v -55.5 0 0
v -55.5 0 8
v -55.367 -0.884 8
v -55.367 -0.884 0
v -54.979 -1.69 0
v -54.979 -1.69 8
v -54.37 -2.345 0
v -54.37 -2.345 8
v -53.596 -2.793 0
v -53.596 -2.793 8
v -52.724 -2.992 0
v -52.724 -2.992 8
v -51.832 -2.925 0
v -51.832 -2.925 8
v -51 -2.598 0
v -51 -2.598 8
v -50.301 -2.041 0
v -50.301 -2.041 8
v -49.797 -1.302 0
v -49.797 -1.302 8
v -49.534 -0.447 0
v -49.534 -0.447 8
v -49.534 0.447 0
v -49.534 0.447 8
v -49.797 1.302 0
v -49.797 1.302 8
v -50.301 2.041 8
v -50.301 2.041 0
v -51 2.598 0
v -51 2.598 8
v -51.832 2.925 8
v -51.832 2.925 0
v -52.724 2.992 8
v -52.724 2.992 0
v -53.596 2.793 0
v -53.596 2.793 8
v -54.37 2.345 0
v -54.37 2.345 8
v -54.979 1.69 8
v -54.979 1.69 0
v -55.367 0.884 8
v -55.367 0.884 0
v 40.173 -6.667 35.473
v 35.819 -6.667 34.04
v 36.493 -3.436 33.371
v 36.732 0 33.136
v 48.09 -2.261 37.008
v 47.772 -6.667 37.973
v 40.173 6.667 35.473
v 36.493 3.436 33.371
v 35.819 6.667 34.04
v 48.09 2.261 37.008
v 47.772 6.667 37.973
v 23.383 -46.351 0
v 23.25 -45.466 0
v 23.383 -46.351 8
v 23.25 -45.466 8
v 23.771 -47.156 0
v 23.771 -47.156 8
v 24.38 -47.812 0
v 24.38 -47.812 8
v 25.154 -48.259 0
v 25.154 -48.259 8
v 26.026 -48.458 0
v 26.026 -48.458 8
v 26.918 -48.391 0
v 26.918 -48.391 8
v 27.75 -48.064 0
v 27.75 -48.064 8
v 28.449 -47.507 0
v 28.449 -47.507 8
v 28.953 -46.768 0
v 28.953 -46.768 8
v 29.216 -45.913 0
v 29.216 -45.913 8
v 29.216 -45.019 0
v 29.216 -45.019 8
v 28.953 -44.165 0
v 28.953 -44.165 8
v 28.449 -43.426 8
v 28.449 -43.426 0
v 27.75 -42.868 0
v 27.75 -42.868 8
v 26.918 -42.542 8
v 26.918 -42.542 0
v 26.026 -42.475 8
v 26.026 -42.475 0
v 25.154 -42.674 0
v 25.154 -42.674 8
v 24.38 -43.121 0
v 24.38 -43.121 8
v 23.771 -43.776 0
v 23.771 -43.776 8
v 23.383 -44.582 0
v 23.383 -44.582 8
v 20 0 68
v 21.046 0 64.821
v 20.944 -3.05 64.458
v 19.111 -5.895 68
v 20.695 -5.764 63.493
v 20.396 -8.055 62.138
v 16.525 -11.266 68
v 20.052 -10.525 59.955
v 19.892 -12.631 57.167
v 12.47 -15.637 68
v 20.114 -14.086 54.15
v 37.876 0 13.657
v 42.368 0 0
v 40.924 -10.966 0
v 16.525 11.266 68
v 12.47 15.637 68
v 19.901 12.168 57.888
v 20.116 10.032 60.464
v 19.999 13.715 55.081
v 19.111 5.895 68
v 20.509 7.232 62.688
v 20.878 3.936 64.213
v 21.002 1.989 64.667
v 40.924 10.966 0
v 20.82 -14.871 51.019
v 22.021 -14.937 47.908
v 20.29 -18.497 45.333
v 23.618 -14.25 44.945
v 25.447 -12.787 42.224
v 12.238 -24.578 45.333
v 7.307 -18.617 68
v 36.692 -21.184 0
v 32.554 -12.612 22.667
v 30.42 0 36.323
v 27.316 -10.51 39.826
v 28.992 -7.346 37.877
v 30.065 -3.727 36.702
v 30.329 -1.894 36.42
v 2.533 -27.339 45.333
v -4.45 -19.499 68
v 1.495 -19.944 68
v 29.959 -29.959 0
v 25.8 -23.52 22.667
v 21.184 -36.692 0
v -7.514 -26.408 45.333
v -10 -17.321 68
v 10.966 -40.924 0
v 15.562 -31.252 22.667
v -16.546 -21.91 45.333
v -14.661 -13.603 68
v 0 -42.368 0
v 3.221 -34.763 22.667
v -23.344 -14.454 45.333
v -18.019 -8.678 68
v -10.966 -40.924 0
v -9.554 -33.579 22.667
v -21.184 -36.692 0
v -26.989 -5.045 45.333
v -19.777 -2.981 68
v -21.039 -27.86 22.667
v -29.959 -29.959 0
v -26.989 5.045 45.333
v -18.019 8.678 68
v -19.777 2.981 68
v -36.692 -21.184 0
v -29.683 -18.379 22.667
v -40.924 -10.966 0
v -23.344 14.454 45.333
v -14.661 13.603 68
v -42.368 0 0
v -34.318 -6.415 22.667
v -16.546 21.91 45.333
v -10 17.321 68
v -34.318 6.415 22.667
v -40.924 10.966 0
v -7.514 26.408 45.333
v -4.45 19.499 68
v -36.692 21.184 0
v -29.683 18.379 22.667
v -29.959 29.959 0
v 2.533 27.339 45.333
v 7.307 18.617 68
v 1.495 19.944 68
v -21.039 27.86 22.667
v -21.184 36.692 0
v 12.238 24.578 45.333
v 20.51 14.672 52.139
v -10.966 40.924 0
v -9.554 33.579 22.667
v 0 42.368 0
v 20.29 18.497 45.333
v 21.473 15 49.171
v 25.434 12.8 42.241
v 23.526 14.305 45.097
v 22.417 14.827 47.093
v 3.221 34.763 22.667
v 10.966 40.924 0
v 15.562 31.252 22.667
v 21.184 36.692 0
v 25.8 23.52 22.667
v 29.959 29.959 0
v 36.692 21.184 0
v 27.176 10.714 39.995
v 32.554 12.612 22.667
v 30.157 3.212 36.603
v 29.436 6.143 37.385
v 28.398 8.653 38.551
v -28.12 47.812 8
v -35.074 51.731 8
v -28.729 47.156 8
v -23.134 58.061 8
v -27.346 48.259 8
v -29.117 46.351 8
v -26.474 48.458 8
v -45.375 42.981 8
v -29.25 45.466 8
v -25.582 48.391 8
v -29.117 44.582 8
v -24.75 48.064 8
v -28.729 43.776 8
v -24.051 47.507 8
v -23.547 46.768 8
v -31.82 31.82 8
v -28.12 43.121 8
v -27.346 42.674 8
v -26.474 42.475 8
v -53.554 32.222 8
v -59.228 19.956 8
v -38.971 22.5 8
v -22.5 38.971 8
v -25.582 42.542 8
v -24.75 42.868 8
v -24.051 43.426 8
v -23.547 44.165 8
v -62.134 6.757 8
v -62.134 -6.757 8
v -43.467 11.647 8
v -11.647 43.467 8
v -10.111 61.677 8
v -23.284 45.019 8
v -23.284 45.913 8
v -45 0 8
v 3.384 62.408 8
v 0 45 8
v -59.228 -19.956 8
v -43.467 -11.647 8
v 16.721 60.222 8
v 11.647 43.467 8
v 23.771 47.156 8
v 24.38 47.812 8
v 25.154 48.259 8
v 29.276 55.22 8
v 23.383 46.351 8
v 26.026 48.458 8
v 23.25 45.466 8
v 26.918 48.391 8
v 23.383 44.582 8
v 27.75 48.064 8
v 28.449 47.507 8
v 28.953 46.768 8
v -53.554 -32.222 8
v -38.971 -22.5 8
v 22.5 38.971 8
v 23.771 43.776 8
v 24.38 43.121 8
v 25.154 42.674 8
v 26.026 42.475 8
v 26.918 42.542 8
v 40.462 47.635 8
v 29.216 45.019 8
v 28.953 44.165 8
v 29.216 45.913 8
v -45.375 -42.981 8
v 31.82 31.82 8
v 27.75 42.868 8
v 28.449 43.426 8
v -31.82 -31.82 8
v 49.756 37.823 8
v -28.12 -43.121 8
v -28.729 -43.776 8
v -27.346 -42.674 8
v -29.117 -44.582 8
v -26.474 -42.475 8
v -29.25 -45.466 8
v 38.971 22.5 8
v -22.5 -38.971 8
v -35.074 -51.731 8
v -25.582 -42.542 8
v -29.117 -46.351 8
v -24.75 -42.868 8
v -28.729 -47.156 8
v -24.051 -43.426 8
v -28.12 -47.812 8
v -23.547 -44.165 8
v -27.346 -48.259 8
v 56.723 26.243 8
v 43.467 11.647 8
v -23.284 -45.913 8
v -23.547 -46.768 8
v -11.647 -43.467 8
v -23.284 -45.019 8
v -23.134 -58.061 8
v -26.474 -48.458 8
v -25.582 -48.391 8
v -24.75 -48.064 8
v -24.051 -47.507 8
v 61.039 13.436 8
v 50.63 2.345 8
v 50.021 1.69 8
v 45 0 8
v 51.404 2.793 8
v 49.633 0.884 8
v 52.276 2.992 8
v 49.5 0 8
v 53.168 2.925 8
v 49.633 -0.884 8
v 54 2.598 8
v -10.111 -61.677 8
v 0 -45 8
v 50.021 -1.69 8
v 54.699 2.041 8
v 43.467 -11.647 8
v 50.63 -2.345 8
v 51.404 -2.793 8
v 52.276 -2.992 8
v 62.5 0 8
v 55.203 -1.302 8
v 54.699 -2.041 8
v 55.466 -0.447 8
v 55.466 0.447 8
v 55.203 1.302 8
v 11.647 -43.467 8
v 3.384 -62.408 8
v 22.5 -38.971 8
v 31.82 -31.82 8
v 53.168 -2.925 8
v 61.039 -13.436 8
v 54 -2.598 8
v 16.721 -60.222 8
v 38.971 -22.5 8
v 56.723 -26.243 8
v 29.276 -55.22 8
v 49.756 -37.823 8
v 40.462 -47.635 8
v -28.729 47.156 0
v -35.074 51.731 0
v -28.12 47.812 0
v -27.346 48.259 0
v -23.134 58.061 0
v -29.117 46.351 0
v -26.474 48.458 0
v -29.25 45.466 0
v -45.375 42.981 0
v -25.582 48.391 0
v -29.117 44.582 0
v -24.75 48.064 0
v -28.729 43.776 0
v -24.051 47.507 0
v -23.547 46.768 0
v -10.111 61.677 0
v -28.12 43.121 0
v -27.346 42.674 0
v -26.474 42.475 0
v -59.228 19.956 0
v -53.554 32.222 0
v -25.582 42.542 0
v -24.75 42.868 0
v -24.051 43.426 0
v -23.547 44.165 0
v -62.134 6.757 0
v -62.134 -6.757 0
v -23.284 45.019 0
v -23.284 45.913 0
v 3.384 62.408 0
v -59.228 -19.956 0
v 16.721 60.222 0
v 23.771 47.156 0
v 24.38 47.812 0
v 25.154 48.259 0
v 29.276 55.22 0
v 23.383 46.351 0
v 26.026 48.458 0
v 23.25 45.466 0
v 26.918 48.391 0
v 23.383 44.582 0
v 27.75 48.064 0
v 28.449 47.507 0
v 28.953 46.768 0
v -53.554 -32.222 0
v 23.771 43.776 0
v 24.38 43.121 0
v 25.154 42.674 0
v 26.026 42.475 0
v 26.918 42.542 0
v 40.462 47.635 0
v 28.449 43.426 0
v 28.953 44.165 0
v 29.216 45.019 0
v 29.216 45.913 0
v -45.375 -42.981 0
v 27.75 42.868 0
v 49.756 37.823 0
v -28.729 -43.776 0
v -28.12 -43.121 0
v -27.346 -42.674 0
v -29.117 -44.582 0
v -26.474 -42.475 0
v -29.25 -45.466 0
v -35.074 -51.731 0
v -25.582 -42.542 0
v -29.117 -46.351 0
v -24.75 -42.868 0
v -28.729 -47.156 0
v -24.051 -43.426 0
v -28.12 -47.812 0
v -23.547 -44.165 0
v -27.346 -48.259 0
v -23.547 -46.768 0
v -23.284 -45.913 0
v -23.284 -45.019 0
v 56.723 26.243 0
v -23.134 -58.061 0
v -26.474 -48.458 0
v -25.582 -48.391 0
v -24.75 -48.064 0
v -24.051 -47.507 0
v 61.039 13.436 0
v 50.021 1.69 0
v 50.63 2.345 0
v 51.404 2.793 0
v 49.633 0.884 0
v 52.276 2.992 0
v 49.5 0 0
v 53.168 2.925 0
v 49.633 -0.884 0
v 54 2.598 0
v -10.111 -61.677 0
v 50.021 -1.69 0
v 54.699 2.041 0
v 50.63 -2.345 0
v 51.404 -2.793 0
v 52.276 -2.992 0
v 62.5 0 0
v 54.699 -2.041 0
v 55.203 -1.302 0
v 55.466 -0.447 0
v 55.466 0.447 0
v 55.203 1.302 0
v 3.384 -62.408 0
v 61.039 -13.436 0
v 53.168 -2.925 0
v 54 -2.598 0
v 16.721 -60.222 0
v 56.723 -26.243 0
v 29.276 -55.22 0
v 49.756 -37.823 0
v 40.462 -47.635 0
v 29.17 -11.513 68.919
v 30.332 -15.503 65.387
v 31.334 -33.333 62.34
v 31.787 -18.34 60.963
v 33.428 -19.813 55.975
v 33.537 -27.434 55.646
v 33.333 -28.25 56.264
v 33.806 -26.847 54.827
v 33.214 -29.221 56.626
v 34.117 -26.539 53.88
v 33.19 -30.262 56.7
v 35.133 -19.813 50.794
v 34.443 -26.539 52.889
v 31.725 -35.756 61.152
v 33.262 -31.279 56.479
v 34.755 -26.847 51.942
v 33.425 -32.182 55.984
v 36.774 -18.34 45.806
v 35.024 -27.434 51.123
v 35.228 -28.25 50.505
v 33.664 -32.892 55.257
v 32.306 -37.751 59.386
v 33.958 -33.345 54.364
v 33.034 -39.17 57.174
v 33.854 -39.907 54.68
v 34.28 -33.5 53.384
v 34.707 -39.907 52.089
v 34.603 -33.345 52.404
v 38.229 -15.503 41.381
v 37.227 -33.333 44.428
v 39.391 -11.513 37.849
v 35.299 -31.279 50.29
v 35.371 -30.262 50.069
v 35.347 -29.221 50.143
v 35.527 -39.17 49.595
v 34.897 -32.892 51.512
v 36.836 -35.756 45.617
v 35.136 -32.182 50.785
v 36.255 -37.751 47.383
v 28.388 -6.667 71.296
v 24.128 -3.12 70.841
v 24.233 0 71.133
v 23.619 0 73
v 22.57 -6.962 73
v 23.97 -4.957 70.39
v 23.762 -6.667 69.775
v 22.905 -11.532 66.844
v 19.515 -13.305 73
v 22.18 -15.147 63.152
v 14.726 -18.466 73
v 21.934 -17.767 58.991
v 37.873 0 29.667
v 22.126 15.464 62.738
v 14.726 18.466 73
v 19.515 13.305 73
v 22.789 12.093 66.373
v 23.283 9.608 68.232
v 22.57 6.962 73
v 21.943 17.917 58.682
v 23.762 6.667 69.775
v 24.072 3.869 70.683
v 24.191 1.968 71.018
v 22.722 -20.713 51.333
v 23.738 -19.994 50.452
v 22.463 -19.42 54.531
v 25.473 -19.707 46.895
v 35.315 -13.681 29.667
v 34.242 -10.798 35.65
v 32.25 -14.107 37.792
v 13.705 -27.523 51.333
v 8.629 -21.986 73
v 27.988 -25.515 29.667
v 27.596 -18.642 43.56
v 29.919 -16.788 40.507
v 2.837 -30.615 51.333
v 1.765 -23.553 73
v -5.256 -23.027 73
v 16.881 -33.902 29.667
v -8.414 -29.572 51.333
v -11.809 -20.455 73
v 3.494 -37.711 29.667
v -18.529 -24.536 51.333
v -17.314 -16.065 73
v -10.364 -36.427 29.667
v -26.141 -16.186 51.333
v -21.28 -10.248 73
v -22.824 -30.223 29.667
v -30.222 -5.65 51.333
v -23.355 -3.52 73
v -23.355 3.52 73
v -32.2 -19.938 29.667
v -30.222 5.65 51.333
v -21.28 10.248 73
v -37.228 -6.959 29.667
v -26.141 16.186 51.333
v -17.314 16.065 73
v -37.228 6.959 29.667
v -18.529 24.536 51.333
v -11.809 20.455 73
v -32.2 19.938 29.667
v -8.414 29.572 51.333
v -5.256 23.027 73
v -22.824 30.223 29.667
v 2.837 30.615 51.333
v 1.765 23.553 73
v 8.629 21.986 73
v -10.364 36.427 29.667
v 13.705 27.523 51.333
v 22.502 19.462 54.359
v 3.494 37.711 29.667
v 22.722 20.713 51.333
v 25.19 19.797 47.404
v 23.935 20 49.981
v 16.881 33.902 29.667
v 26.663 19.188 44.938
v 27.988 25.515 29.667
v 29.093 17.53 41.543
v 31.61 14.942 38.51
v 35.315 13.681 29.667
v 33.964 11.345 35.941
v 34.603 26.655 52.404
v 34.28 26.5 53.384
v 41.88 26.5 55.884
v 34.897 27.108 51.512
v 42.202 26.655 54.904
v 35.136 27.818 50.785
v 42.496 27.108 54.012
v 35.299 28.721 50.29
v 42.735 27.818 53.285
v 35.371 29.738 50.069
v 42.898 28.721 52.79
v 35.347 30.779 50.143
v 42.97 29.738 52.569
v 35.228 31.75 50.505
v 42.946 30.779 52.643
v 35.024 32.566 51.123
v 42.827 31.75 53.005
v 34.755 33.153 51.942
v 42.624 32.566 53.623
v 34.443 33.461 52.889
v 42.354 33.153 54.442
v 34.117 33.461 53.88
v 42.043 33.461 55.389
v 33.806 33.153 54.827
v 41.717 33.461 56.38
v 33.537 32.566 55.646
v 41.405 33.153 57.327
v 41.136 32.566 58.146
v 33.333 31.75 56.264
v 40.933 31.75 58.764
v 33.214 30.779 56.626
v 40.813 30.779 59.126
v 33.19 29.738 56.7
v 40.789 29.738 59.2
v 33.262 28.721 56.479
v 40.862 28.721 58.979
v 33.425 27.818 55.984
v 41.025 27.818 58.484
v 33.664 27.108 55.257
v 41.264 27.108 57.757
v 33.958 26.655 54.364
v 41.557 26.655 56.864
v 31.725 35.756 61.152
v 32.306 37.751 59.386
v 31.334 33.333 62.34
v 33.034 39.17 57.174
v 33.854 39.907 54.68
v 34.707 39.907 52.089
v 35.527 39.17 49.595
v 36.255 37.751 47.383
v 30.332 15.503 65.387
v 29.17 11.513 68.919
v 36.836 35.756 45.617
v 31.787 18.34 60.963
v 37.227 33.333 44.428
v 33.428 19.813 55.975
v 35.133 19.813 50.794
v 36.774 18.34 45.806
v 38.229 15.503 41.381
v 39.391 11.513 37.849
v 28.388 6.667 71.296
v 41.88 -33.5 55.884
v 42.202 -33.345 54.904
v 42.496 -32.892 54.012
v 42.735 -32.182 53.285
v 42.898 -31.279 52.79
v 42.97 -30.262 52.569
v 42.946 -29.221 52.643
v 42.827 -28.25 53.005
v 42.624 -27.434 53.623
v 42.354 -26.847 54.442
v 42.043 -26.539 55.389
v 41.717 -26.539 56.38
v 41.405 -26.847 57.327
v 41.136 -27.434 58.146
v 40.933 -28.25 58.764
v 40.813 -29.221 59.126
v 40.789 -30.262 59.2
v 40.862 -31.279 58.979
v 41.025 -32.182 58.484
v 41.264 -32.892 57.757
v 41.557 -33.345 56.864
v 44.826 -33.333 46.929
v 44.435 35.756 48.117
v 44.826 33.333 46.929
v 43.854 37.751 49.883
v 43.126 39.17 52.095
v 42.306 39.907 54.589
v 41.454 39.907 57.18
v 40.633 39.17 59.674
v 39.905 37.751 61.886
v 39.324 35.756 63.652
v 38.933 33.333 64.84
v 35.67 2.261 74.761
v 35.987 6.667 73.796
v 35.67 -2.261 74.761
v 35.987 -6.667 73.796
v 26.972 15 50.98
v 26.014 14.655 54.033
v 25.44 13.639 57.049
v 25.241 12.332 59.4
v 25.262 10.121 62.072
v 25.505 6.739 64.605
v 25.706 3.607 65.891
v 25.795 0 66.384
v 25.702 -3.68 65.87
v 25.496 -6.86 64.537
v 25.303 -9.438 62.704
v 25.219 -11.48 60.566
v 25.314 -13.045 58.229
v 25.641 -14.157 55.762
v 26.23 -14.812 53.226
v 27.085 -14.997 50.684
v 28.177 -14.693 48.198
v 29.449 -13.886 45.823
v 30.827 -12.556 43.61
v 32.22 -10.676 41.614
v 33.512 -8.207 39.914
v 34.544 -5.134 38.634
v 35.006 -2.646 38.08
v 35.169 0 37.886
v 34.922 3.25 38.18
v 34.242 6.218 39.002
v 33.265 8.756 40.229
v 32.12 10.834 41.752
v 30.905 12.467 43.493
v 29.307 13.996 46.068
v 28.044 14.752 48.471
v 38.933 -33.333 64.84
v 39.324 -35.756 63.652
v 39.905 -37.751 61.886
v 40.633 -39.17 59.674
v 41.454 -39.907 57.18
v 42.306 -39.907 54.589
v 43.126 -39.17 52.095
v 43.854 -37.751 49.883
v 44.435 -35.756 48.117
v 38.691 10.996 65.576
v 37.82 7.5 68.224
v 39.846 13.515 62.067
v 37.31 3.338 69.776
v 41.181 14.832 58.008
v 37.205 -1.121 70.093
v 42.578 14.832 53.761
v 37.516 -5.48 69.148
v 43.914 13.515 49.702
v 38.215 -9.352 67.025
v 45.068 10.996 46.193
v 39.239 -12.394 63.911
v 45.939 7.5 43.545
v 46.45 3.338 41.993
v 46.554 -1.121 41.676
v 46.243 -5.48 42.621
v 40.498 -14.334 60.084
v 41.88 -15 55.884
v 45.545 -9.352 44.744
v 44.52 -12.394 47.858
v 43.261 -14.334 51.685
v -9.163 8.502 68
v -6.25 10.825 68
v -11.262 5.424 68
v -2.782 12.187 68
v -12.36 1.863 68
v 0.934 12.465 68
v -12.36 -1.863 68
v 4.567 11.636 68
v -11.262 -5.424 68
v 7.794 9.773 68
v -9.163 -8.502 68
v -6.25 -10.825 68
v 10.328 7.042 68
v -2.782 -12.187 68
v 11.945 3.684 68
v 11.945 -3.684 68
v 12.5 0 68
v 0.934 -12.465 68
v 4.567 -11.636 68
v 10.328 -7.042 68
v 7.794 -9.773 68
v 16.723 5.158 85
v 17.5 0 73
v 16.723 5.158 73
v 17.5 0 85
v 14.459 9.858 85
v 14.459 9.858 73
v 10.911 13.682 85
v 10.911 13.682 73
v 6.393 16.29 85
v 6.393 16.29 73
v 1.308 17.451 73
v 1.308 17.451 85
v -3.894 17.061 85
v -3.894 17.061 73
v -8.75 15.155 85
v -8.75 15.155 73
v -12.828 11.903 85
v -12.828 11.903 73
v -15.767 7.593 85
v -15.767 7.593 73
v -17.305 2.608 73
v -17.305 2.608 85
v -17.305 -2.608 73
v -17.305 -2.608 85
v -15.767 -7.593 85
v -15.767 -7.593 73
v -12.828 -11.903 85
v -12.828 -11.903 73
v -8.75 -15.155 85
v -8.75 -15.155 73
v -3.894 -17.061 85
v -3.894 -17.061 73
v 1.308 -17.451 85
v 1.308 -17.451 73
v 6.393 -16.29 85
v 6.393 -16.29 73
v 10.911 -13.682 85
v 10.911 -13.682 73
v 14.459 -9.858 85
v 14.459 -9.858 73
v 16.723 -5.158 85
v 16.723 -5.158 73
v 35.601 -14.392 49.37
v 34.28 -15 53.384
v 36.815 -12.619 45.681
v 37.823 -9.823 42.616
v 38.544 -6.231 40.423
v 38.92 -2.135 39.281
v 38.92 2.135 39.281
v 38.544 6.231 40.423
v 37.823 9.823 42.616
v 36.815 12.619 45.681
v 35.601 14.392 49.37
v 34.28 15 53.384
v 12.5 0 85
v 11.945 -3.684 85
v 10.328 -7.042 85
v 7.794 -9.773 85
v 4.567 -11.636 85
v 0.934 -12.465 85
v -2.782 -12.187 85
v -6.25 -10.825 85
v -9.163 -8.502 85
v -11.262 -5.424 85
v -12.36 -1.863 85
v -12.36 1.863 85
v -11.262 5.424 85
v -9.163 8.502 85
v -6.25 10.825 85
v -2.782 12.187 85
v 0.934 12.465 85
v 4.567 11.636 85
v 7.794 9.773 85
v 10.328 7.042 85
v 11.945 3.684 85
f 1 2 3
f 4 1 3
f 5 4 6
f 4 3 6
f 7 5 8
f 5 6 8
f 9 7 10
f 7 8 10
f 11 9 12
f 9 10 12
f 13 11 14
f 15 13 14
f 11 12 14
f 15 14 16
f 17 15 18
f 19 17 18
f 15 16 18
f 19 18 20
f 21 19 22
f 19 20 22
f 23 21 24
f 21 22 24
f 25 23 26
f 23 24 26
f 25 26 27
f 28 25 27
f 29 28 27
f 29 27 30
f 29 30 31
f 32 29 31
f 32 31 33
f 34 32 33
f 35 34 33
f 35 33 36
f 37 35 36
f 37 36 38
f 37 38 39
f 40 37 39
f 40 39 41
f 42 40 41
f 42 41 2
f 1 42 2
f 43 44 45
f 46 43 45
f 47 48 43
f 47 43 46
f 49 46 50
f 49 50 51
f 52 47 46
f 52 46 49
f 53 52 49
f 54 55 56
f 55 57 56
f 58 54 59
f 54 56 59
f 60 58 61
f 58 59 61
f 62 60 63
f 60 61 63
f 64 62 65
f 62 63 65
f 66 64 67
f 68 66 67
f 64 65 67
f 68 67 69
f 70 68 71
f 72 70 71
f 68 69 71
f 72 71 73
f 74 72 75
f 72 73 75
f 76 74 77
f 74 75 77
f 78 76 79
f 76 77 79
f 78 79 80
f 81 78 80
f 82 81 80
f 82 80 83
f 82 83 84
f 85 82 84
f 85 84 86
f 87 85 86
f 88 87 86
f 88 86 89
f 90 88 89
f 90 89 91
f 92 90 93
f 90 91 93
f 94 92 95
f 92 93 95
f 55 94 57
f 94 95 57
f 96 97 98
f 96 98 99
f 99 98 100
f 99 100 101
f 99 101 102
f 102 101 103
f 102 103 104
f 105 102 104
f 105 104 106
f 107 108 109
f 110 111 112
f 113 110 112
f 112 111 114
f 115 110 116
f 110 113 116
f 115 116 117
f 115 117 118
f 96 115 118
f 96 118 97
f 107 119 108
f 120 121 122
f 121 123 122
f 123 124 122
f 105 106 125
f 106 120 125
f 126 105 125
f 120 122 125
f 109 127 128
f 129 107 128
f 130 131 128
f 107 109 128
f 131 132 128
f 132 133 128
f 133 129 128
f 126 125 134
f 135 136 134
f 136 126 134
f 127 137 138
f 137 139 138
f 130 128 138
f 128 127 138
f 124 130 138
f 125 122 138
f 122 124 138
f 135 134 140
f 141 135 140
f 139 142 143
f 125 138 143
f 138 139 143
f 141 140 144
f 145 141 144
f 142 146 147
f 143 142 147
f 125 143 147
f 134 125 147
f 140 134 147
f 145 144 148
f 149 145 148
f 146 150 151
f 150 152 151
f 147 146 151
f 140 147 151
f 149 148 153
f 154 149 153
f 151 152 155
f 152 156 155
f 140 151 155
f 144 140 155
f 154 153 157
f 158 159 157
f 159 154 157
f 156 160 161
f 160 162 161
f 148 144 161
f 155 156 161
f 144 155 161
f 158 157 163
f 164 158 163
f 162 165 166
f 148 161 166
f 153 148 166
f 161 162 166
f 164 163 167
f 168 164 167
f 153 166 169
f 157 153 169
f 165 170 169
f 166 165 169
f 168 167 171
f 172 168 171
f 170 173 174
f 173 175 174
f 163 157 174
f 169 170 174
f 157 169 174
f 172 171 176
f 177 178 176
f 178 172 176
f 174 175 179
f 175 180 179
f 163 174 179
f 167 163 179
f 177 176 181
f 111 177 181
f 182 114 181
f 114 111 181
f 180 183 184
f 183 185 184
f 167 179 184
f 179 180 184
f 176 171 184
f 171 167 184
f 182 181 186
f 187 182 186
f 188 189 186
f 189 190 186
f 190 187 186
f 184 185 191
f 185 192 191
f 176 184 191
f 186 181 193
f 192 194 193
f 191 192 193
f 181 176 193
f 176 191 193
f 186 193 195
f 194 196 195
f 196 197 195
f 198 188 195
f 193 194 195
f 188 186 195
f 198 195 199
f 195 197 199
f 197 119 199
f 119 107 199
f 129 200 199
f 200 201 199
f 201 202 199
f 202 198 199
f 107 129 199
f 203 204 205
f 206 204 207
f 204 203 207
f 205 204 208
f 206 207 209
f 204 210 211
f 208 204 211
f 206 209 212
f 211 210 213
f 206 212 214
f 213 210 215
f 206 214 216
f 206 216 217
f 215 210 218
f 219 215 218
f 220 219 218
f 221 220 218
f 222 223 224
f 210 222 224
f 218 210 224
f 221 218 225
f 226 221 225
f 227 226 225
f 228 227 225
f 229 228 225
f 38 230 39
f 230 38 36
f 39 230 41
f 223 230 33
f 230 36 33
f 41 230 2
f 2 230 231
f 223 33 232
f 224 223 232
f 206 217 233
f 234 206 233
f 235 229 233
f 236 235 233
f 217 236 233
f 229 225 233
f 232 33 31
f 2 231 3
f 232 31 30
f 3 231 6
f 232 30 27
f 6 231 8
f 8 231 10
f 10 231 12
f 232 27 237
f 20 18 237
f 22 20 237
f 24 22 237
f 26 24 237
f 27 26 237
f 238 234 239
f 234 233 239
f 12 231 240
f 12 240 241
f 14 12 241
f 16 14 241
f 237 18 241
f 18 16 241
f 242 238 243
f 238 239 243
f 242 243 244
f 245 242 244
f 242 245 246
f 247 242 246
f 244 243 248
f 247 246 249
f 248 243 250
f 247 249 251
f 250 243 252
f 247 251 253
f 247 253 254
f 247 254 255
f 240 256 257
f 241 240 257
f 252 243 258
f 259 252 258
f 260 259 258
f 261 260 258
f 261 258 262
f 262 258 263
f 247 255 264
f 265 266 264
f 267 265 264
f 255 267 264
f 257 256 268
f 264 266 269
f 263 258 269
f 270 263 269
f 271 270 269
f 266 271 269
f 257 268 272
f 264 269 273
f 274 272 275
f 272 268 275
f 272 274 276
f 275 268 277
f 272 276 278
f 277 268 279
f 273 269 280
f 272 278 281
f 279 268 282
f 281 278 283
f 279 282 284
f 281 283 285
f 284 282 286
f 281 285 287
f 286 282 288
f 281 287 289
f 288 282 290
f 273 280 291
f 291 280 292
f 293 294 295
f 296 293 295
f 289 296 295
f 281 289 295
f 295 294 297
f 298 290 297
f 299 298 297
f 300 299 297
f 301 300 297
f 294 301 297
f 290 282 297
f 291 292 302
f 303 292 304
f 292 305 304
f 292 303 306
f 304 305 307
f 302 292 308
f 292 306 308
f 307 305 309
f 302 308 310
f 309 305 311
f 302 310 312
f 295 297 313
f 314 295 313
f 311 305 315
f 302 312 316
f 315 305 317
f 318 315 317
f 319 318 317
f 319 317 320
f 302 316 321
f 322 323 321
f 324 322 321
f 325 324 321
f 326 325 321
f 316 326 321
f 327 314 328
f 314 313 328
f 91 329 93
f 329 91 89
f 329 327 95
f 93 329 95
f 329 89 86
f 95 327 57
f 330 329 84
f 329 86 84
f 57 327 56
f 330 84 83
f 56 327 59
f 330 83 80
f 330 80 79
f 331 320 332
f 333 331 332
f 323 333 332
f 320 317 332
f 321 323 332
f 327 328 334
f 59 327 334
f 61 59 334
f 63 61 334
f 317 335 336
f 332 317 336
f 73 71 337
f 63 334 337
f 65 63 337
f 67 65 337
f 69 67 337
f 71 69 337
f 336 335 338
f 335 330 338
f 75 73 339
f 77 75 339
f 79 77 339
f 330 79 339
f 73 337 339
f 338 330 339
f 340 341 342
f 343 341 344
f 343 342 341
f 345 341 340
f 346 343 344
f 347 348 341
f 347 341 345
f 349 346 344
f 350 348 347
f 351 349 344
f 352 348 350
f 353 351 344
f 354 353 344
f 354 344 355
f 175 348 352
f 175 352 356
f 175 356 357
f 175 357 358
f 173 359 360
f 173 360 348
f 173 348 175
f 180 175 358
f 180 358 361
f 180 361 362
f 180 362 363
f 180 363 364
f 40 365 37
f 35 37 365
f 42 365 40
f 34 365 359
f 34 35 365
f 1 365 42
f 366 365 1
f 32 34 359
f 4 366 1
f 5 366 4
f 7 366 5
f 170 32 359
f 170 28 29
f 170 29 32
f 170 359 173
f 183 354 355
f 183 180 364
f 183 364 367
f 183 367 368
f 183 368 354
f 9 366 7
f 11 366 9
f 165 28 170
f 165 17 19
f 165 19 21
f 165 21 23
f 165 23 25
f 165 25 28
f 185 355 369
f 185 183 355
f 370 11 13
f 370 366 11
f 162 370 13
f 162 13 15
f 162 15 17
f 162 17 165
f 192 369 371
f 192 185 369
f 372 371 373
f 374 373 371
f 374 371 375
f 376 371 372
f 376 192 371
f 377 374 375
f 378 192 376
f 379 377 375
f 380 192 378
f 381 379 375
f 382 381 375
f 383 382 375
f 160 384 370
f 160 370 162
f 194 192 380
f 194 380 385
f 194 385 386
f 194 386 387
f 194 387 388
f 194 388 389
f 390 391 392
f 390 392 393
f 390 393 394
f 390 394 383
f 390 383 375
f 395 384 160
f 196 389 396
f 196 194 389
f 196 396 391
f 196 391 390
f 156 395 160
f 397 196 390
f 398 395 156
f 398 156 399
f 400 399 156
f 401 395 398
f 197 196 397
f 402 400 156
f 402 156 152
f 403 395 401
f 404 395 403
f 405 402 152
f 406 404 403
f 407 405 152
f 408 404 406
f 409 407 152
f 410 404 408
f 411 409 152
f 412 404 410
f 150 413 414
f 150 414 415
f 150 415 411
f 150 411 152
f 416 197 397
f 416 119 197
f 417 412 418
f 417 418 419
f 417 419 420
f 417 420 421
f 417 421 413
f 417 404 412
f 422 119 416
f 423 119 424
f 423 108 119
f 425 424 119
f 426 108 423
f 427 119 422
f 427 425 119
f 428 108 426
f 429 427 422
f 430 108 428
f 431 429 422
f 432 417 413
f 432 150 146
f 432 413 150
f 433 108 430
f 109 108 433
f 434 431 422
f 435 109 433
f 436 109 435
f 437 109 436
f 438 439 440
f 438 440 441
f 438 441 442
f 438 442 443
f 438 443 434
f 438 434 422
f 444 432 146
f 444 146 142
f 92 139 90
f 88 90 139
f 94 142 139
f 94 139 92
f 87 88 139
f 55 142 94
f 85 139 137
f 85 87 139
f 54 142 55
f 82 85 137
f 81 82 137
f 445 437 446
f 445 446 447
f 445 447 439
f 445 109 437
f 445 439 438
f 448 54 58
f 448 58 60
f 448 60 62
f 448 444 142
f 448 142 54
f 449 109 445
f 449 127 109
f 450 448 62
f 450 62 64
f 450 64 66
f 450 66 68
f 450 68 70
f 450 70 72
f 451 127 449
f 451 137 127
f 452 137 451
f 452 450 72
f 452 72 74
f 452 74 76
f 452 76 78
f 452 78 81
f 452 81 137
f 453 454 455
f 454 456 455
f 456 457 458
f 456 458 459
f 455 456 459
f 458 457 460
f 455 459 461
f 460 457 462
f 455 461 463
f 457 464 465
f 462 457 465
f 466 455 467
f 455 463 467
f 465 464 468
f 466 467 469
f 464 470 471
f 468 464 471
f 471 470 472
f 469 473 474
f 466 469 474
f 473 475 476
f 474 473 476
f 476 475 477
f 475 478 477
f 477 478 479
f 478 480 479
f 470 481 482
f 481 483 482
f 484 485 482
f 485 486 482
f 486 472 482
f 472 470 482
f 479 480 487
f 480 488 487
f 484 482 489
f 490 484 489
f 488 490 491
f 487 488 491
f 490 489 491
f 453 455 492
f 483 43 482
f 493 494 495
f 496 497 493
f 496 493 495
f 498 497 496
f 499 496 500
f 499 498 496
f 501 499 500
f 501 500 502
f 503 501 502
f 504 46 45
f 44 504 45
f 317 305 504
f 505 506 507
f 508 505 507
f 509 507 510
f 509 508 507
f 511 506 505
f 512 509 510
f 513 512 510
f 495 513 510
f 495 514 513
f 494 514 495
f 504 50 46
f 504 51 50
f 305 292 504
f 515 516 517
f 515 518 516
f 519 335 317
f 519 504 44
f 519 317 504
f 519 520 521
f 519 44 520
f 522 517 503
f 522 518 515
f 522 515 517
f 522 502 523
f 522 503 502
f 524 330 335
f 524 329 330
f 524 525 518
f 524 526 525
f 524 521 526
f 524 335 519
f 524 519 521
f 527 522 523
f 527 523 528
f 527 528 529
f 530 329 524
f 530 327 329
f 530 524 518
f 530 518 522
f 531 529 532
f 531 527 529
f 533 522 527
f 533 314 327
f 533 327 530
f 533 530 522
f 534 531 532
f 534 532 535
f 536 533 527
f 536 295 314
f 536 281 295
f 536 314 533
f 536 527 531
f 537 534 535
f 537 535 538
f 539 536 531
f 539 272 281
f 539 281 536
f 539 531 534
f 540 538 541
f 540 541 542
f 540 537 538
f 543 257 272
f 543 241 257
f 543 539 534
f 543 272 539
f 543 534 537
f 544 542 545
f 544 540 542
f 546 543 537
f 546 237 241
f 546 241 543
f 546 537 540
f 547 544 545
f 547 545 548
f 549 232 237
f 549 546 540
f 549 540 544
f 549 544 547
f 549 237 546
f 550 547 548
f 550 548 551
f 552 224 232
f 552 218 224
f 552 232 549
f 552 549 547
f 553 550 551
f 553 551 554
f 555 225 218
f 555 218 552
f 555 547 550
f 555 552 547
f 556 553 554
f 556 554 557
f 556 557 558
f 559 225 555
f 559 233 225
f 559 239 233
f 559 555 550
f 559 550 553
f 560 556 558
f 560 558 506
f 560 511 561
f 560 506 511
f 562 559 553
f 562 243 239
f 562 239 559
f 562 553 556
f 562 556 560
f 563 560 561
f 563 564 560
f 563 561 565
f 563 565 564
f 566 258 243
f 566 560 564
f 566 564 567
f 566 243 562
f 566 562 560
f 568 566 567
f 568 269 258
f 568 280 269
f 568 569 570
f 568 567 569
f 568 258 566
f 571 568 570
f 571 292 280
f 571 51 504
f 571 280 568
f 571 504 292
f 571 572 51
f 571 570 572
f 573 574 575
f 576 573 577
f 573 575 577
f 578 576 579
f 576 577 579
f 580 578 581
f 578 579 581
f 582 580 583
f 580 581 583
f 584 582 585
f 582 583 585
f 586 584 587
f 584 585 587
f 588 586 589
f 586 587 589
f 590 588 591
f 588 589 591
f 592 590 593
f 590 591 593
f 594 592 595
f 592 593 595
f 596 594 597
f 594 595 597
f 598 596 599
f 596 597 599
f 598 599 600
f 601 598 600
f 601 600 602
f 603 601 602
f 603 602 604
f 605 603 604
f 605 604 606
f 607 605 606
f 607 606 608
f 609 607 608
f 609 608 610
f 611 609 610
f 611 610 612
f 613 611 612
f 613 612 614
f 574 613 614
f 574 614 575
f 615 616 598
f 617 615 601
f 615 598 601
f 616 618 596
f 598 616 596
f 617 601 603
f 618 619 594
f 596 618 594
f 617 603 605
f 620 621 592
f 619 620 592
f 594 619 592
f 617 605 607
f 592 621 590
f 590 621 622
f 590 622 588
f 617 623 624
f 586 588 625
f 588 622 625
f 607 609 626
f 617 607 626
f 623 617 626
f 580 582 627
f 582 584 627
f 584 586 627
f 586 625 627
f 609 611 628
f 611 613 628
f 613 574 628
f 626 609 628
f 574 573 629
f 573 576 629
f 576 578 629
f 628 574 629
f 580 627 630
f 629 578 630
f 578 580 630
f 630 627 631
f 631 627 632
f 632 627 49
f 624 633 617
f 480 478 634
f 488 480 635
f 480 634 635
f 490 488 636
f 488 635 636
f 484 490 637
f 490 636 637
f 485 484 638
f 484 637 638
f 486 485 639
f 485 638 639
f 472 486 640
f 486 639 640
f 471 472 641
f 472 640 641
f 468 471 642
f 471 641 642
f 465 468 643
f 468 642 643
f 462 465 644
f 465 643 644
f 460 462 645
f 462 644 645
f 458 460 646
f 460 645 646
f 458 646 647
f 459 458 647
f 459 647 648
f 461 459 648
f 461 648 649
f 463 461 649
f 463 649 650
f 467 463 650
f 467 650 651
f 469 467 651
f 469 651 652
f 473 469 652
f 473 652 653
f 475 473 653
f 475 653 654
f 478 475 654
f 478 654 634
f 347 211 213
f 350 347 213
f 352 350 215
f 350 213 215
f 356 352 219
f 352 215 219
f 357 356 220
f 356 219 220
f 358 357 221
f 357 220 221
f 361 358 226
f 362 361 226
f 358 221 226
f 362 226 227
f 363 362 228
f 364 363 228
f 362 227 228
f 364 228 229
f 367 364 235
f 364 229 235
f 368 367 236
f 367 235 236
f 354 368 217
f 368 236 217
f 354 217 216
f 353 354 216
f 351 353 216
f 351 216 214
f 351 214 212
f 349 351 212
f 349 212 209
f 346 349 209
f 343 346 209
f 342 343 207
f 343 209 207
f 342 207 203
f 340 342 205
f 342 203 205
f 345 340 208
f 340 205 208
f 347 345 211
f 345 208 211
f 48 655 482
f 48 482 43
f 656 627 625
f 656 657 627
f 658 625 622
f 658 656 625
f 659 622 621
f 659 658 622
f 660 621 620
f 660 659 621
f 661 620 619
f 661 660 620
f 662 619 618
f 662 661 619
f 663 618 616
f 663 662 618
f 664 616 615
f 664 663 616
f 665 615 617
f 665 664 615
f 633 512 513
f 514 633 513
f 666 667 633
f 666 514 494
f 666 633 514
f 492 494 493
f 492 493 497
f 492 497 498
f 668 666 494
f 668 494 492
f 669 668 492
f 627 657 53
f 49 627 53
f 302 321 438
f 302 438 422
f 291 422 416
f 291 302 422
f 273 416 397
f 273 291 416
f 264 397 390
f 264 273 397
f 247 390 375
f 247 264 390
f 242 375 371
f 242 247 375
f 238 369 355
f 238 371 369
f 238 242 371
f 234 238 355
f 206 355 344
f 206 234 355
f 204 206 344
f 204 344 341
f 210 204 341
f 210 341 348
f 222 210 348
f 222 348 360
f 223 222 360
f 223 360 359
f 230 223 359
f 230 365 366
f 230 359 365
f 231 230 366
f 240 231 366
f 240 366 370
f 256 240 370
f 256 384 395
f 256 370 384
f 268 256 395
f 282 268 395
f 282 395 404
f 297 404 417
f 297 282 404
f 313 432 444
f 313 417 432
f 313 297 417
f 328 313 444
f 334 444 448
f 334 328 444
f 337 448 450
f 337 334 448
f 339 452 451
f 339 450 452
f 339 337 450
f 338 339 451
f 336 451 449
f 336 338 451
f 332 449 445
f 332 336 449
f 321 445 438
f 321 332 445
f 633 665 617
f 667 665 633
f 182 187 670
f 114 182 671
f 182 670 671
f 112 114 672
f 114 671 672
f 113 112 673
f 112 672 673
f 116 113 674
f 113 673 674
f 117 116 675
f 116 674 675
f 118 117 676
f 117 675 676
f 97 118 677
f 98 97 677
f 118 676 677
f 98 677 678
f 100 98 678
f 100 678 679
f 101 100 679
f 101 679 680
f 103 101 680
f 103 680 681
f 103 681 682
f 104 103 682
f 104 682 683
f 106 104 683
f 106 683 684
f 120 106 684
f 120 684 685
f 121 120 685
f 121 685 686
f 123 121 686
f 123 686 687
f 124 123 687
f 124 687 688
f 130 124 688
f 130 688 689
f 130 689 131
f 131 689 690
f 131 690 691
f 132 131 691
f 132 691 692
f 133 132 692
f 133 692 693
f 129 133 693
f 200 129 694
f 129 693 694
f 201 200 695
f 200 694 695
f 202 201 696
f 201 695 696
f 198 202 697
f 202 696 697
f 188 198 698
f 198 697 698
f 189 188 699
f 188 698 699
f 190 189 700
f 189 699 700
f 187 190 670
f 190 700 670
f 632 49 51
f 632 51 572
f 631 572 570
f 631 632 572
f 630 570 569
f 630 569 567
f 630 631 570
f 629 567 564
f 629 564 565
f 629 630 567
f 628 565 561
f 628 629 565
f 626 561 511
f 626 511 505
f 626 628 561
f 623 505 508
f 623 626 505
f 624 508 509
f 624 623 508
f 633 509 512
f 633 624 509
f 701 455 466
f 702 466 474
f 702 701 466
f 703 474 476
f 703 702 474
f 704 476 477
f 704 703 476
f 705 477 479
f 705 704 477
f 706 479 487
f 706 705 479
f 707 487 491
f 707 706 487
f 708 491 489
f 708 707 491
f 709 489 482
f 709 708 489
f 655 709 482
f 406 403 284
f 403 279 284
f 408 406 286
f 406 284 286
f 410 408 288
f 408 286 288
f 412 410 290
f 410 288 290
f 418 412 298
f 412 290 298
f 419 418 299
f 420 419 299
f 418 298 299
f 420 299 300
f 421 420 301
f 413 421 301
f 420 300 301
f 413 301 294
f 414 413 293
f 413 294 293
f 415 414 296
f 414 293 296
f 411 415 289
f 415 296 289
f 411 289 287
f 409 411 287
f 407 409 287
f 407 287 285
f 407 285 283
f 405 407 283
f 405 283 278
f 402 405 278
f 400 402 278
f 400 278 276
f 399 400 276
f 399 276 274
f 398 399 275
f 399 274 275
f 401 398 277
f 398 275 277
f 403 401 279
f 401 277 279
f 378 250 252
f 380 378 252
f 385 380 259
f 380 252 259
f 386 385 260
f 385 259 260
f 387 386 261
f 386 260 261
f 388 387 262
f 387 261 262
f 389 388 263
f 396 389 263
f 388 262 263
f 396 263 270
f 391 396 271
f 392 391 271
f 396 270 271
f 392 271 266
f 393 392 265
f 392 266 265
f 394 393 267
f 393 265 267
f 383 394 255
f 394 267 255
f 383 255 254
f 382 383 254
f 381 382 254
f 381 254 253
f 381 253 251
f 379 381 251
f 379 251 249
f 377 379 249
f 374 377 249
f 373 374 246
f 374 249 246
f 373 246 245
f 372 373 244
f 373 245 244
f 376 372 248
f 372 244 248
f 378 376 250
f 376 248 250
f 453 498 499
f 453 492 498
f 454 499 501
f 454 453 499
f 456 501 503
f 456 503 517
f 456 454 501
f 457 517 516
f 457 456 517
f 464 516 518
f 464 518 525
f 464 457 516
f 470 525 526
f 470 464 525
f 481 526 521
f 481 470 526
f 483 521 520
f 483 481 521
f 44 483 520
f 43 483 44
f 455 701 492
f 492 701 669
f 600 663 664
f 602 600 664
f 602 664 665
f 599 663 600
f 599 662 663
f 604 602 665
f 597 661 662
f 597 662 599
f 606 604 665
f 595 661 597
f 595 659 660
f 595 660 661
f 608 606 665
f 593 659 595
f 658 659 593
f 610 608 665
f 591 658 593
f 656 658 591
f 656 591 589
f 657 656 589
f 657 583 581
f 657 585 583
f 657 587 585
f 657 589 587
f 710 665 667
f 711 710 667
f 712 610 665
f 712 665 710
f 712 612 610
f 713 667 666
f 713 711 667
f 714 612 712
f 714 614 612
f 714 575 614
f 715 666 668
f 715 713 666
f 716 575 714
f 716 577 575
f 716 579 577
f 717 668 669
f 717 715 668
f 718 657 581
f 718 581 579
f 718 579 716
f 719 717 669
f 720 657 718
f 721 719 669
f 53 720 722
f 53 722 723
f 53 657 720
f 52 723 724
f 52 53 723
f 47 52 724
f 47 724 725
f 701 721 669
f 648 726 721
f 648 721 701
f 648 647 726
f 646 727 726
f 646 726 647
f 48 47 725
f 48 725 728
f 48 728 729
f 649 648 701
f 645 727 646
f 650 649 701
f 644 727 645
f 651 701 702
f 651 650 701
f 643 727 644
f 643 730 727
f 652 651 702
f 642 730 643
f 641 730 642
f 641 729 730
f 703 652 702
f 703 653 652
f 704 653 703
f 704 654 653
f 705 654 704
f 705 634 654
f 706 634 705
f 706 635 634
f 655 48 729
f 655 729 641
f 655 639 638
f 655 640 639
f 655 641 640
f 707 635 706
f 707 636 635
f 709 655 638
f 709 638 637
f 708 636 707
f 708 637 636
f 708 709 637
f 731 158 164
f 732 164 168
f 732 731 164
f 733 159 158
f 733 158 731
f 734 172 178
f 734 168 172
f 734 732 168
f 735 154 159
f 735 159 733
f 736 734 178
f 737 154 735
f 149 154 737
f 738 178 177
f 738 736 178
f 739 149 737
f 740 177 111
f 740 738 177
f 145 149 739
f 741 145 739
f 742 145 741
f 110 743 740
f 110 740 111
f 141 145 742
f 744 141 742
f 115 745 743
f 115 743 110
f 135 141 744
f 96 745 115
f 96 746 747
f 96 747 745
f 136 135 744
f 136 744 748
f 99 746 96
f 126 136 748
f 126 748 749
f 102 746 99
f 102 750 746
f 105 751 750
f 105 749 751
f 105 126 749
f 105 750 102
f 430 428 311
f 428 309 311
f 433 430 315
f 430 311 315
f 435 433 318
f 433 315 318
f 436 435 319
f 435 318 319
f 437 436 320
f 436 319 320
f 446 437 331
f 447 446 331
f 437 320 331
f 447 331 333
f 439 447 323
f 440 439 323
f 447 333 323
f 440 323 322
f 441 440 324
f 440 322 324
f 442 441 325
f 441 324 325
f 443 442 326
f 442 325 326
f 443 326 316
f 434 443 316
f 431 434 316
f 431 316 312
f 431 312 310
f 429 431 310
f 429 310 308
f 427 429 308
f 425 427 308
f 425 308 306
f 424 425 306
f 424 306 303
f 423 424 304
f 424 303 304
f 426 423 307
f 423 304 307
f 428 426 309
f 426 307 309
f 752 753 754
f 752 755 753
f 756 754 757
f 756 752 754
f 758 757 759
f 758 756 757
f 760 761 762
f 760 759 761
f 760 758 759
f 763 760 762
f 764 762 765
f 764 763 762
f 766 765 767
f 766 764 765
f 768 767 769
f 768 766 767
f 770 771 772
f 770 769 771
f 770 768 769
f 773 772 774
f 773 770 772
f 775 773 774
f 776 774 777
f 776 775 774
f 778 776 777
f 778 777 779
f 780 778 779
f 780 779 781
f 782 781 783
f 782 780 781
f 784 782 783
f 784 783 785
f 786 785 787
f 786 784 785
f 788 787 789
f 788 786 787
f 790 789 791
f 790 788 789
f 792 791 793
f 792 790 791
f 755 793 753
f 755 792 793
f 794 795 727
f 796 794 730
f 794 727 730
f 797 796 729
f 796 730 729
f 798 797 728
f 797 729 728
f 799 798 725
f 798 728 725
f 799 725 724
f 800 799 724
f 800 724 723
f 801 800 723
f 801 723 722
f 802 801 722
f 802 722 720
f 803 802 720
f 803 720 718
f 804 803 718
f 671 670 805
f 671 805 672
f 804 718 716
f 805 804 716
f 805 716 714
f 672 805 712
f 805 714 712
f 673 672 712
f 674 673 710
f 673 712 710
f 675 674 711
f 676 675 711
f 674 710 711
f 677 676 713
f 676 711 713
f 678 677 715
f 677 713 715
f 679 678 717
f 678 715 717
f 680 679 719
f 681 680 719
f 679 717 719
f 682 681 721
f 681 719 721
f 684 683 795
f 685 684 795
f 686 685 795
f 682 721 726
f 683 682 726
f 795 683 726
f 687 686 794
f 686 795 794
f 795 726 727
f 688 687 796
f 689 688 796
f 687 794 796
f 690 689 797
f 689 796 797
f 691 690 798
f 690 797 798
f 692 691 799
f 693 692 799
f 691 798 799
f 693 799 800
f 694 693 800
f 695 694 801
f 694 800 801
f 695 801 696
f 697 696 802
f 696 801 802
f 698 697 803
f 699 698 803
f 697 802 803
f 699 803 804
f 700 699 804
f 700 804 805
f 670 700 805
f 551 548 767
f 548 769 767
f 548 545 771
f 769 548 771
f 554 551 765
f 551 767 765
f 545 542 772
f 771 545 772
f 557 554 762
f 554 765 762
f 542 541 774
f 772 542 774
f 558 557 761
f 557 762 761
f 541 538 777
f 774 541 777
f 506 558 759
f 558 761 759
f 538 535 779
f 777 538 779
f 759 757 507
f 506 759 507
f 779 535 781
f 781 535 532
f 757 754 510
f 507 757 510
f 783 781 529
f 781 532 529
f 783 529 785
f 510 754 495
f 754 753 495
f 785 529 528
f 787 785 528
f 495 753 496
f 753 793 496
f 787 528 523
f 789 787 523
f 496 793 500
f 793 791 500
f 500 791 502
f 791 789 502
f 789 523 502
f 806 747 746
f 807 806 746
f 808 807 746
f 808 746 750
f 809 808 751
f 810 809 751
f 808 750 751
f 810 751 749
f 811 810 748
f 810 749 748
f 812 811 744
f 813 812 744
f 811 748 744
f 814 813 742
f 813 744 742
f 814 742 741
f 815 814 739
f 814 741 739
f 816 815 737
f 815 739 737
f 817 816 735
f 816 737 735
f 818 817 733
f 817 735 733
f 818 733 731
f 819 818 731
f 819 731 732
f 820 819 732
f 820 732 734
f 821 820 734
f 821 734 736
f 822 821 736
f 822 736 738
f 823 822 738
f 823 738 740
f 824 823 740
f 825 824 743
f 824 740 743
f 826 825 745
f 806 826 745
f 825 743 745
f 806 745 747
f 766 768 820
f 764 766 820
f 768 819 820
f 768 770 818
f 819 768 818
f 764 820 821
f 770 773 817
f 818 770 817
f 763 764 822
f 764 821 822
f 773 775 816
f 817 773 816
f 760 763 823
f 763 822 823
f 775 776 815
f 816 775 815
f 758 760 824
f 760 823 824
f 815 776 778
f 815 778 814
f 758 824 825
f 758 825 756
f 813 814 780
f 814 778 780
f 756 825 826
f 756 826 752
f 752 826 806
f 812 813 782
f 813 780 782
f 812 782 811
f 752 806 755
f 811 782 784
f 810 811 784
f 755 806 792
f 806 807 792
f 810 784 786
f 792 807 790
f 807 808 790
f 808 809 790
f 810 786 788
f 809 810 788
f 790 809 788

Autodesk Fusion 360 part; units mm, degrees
sketch "草图1" plane through (0, 0, 0) normal (0, 1, 0) x (1, 0, 0)
  line L0 (0, -80) -> (0, 30) construction
  line L1 (42.368, 0) -> (62.5, 0)
  line L2 (62.5, 0) -> (62.5, -8)
  line L3 (62.5, -8) -> (45, -8)
  line L4 (45, -8) -> (23.6189, -73)
  line L5 (23.6189, -73) -> (17.5, -73)
  line L6 (17.5, -73) -> (17.5, -85)
  line L7 (17.5, -85) -> (12.5, -85)
  line L8 (12.5, -85) -> (12.5, -68)
  line L9 (12.5, -68) -> (20, -68)
  line L10 (20, -68) -> (42.368, 0)
  dimension "d1" = 5
  dimension "d2" = 8
  dimension "d3" = 62.5
  dimension "d4" = 45
  dimension "d5" = 5
  dimension "d7" = 12
  dimension "d8" = 5
  dimension "d9" = 17.5
  dimension "d10" = 20
  dimension "d11" = 85
revolve "旋转1" add sketch "草图1" angle 360 about axis through (0, 0, 80) along (0, 0, -1) makes body 1
sketch "草图2" plane through (0, 0, 8) normal (0, 0, 1) x (-1, 0, 0)
  circle A0 centre (0, 0) radius 62.5
  circle A1 centre (0, 0) radius 45
  circle A2 centre (-52.5, 0) radius 3
  circle A3 centre (-26.25, -45.4663) radius 3
  circle A4 centre (26.25, -45.4663) radius 3
  circle A5 centre (52.5, 0) radius 3
  circle A6 centre (26.25, 45.4663) radius 3
  circle A7 centre (-26.25, 45.4663) radius 3
  dimension "d13" = 6
  dimension "d14" = 52.5
  dimension "d16" = 360
extrude "拉伸1" cut sketch "草图2" against normal blind 20 contours A2 | A3 | A4 | A5 | A6 | A7 bodies 1
sketch "草图3" plane through (0, 0, 0) normal (0, 1, 0) x (1, 0, 0)
ref_plane "工作平面1" through (34.3094, 0, 40.5) normal (0.9499, 0, 0.3125) x (0, -1, 0)
ref_plane "工作平面2" through (45.7086, 0, 44.2496) normal (0.9499, 0, 0.3125) x (0, -1, 0)
sketch "草图4" plane through (54.38, 0, 17.8878) normal (0.9499, 0, 0.3125) x (0, -1, 0)
sketch "草图5" plane through (54.38, 0, 17.8878) normal (0.9499, 0, 0.3125) x (0, -1, 0)
  circle A0 centre (-30, -40) radius 3.5
  circle A1 centre (30, -40) radius 3.5
  line L0 (33.3333, -49.4281) -> (6.6667, -58.8562)
  line L1 (33.3333, -30.5719) -> (6.6667, -21.1438)
  line L2 (-33.3333, -30.5719) -> (-6.6667, -21.1438)
  line L3 (-33.3333, -49.4281) -> (-6.6667, -58.8562)
  circle A2 centre (0, -40) radius 15
  line L4 (0, -75) -> (0, 0) construction
  arc A3 (33.3333, -49.4281) -> (33.3333, -30.5719) centre (30, -40) ccw
  arc A4 (6.6667, -21.1438) -> (-6.6667, -21.1438) centre (0, -40) ccw
  arc A5 (-6.6667, -58.8562) -> (6.6667, -58.8562) centre (0, -40) ccw
  arc A6 (-33.3333, -30.5719) -> (-33.3333, -49.4281) centre (-30, -40) ccw
  line L5 (0, 13.2387) -> (0, 19.5294)
  point P0 (0, -75.9942)
  dimension "d21" = 7
  dimension "d22" = 20
  dimension "d23" = 40
  dimension "d24" = 60
  dimension "d25" = 30
  dimension "d27" = 30
  dimension "d29" = 50
extrude "拉伸2" add sketch "草图5" against normal blind 8 separate body makes body 2
sketch "草图6" plane through (54.38, 0, 17.8878) normal (0.9499, 0, 0.3125) x (0, 1, 0)
  circle A0 centre (30, 40) radius 3.5
  circle A1 centre (-30, 40) radius 3.5
  circle A2 centre (0, 40) radius 15
  arc A3 (-33.3333, 49.4281) -> (-33.3333, 30.5719) centre (-30, 40) ccw
  line L0 (-33.3333, 30.5719) -> (-6.6667, 21.1438)
  arc A4 (-6.6667, 21.1438) -> (6.6667, 21.1438) centre (0, 40) ccw
  line L1 (6.6667, 21.1438) -> (33.3333, 30.5719)
  arc A5 (33.3333, 30.5719) -> (33.3333, 49.4281) centre (30, 40) ccw
  line L2 (33.3333, 49.4281) -> (6.6667, 58.8562)
  arc A6 (6.6667, 58.8562) -> (-6.6667, 58.8562) centre (0, 40) ccw
  line L3 (-6.6667, 58.8562) -> (-33.3333, 49.4281)
  circle A7 centre (0, 40) radius 20
  circle A8 centre (0, 40) radius 15
extrude "拉伸3" add sketch "草图6" along normal up to surface contours A4 A6 A7 end surface at (-14.1168, 35.9689, 11.3333) on bodies 1 bodies 1 2
extrude "拉伸4" cut sketch "草图6" along normal up to surface contours A2 A8 end surface at (35.1613, -4.3771, 21.0837) on bodies 1 bodies 1
equation "d3 = ( 125 / 2 ) * 1 mm"
equation "d14 = ( 105 / 2 ) * 1 mm"
